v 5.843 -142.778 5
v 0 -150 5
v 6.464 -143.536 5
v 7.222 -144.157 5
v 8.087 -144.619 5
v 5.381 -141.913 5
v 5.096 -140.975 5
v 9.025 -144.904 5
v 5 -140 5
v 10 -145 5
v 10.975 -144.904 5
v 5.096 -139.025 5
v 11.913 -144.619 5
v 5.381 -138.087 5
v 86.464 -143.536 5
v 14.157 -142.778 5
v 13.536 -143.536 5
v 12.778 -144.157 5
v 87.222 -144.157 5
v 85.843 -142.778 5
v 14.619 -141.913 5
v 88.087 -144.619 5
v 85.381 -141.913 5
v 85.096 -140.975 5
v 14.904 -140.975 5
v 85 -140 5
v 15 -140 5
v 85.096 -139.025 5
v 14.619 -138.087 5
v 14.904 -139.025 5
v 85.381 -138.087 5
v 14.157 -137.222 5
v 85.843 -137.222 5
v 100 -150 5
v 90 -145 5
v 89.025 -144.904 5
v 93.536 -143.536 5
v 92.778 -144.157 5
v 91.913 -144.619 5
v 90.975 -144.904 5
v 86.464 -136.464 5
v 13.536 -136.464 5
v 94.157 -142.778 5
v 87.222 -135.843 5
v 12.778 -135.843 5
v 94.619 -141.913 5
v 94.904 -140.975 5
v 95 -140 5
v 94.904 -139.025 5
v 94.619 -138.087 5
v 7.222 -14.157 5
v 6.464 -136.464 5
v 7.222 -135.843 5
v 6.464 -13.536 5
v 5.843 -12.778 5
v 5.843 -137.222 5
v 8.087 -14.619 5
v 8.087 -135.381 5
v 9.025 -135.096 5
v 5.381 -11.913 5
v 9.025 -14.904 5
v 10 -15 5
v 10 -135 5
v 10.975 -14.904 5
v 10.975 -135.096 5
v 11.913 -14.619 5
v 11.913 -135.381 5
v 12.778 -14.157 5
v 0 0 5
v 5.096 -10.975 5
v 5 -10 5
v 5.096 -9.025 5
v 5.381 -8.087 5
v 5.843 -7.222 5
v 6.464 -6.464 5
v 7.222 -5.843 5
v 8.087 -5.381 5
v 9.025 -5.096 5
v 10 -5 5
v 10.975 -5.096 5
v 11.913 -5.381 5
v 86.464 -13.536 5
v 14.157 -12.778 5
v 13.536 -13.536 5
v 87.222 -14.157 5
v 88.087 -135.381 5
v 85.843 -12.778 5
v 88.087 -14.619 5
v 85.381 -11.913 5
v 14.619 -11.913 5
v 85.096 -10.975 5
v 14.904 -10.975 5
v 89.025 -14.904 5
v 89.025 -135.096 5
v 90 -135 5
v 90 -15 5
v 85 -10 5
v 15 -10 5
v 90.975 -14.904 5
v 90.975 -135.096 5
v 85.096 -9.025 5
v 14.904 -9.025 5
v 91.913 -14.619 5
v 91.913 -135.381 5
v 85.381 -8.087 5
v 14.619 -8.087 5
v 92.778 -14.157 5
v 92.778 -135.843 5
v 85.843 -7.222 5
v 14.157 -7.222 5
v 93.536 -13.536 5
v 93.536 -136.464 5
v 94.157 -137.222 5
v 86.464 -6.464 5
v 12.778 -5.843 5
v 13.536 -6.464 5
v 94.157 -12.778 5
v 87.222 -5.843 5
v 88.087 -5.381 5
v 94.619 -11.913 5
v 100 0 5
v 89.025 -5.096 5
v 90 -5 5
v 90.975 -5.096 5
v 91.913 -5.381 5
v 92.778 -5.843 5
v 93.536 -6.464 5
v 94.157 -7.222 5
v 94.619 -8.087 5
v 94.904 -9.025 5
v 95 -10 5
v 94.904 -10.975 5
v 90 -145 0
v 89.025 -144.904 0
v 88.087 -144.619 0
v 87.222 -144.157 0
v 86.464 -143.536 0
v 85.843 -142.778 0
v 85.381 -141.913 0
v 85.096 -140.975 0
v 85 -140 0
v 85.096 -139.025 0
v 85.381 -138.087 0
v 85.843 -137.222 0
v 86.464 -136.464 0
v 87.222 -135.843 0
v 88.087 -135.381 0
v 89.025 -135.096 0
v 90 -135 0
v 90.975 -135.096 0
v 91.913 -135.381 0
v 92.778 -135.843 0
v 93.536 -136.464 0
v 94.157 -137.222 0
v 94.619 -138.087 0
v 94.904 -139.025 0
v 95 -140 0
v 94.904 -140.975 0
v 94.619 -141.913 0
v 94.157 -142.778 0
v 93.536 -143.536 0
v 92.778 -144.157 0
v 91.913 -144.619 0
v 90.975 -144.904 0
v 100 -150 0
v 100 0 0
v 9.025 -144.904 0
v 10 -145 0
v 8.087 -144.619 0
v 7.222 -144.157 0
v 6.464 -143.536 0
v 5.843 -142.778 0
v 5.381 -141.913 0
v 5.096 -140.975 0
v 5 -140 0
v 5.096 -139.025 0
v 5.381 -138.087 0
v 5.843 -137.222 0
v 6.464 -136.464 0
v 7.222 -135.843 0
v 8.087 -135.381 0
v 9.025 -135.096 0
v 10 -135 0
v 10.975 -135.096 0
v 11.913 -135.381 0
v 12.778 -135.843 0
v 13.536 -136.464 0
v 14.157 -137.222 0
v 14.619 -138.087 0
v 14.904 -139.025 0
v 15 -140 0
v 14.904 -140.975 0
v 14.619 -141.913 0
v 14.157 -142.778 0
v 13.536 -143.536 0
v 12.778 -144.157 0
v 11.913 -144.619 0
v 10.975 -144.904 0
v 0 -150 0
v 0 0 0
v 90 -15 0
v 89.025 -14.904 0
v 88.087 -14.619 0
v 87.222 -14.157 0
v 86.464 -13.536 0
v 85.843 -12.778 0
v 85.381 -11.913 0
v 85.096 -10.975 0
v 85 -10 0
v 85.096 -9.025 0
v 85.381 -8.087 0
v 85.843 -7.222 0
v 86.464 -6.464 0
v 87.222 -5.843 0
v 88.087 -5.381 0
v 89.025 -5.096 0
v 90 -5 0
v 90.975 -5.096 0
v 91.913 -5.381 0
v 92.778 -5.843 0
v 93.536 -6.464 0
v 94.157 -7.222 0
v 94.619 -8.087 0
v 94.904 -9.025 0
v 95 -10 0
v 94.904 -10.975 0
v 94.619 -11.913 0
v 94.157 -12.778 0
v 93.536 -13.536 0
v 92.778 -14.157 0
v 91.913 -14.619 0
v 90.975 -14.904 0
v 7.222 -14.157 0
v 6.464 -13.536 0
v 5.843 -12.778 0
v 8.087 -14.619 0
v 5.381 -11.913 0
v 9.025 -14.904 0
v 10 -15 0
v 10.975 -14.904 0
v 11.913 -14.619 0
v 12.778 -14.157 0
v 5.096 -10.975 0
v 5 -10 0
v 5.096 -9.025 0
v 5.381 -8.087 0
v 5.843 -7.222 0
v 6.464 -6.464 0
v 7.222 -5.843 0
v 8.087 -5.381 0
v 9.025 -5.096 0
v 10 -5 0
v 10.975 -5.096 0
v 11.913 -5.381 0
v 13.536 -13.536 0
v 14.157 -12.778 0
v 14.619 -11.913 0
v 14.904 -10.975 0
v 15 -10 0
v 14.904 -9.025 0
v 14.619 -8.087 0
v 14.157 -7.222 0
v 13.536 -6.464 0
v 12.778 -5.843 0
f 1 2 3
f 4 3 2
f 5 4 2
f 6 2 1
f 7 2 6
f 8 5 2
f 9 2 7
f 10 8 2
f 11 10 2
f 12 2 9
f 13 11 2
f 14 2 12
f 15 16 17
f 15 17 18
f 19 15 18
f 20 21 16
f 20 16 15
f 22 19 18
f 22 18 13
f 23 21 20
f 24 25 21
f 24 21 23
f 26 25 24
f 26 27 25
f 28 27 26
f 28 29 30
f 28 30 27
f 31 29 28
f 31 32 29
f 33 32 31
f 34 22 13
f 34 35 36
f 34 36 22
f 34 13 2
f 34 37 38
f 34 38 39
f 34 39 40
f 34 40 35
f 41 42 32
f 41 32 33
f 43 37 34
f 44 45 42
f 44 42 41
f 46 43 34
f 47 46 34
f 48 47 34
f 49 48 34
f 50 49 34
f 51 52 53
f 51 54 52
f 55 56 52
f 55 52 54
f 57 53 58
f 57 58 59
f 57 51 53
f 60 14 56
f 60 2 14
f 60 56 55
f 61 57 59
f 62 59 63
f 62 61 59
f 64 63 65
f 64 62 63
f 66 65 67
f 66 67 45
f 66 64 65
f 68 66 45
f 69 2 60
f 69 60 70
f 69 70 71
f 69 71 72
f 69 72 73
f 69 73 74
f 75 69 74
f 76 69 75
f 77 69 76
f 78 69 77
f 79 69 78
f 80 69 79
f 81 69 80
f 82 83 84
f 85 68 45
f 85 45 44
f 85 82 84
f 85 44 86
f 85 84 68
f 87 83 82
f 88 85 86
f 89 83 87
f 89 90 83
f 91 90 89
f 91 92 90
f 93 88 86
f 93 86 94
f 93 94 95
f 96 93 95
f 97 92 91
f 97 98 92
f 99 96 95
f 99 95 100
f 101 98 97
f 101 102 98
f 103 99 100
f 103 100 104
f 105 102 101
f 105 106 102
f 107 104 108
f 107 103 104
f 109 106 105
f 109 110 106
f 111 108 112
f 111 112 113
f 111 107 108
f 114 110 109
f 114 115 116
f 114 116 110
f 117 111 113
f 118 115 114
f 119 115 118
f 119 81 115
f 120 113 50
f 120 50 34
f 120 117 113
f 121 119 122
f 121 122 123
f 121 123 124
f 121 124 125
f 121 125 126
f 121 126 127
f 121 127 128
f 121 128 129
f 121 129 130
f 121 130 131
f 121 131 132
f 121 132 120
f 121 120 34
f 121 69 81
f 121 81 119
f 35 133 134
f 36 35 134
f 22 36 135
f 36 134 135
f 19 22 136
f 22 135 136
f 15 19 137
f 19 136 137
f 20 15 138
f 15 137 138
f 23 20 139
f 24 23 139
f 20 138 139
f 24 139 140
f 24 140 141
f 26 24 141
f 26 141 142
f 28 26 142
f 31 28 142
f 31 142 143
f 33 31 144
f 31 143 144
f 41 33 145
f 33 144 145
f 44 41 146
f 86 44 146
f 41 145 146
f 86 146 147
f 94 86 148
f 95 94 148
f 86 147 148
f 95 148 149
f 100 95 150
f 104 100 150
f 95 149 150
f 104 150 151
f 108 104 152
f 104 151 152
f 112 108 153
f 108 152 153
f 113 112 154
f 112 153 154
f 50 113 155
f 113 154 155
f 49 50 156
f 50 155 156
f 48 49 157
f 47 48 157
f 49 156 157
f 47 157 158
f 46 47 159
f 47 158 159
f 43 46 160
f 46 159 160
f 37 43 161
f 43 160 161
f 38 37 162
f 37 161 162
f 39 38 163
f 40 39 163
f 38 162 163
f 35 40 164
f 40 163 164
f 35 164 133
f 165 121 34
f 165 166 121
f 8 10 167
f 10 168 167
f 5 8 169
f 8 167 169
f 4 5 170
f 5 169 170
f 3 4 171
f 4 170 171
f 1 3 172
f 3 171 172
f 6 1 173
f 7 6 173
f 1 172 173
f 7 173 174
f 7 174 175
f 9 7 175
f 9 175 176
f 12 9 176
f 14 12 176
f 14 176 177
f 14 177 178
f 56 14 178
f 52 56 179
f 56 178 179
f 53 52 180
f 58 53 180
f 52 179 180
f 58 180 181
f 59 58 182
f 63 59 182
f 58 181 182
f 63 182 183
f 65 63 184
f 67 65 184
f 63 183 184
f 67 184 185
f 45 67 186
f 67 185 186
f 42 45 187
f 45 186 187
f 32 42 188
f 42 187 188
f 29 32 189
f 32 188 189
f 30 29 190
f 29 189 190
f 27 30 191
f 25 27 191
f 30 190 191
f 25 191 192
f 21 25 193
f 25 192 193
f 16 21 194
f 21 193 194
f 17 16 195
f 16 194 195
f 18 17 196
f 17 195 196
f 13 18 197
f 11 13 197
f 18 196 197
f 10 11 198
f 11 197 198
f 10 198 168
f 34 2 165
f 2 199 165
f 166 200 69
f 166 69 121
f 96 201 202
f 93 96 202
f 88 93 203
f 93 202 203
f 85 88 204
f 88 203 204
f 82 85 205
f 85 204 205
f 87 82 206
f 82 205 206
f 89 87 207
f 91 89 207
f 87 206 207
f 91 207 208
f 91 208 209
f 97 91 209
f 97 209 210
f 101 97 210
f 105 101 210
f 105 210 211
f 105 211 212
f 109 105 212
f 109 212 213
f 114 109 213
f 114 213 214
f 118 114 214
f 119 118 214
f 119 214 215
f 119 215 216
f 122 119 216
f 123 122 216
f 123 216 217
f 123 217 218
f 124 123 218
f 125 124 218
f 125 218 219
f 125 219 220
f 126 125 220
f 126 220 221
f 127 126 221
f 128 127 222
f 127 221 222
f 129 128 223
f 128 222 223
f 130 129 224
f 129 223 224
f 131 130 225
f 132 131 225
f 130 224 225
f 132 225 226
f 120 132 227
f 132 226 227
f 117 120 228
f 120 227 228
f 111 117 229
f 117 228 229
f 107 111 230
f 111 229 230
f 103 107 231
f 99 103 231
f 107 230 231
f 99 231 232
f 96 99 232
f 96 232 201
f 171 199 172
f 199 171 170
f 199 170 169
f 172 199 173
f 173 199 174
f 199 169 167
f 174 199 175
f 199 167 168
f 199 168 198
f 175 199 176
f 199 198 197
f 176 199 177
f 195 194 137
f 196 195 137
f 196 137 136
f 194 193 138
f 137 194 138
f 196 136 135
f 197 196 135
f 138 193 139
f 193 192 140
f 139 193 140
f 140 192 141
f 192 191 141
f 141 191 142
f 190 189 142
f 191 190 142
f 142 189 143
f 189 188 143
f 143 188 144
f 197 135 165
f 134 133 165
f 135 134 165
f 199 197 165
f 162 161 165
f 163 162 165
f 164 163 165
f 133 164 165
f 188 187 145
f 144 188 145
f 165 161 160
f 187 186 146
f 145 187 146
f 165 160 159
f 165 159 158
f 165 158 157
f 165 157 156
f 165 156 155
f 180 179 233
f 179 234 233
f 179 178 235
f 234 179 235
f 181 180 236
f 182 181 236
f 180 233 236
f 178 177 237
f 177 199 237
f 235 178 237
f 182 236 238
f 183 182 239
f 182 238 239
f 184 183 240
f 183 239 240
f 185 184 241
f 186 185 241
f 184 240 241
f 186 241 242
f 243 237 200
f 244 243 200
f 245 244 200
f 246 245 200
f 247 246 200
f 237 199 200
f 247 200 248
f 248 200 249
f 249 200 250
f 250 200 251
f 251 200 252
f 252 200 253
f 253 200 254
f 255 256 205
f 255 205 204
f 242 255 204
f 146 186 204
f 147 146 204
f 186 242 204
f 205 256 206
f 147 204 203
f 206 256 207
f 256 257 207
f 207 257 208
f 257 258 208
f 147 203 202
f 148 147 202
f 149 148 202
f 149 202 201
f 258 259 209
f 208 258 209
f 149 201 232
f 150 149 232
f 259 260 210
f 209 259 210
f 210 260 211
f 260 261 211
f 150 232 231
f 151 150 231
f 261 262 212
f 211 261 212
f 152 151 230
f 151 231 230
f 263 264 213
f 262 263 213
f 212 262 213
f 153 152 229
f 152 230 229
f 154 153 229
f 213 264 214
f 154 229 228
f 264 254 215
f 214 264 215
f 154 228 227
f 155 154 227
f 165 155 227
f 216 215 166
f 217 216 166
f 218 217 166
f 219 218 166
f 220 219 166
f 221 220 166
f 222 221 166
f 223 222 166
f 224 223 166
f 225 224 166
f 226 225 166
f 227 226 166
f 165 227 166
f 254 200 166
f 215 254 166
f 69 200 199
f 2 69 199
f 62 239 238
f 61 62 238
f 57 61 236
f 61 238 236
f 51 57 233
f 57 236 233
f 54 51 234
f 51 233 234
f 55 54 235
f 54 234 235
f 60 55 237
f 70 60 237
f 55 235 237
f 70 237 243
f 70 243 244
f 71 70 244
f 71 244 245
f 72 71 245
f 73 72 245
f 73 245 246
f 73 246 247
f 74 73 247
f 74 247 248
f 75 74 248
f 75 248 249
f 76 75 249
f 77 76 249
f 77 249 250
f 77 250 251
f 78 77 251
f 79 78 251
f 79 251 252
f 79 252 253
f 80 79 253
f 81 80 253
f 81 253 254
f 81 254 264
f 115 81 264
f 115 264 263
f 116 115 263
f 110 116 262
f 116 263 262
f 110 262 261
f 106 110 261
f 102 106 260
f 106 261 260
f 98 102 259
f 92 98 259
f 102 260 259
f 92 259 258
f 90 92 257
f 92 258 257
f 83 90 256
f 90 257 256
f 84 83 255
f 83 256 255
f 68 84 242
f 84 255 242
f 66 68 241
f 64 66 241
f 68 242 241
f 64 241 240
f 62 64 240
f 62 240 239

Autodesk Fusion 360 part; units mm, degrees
sketch "Sketch1" plane through (0, 0, 0) normal (0, 0, 1) x (1, 0, 0)
  line L0 (0, 0) -> (100, 0)
  line L1 (100, 0) -> (100, -150)
  line L2 (0, 0) -> (0, -150)
  line L3 (0, -150) -> (100, -150)
  dimension "d1" = 100
  dimension "d2" = 150
extrude "Extrude1" add sketch "Sketch1" along normal blind 5
hole "Hole1" at (10, -10, 5) direction (0, 0, -1) diameter 10 depth 5 tip angle 180
hole "Hole2" at (90, -10, 5) direction (0, 0, -1) diameter 10 depth 5 tip angle 180
hole "Hole3" at (10, -140, 5) direction (0, 0, -1) diameter 10 depth 5 tip angle 180
hole "Hole4" at (90, -140, 5) direction (0, 0, -1) diameter 10 depth 5 tip angle 180
